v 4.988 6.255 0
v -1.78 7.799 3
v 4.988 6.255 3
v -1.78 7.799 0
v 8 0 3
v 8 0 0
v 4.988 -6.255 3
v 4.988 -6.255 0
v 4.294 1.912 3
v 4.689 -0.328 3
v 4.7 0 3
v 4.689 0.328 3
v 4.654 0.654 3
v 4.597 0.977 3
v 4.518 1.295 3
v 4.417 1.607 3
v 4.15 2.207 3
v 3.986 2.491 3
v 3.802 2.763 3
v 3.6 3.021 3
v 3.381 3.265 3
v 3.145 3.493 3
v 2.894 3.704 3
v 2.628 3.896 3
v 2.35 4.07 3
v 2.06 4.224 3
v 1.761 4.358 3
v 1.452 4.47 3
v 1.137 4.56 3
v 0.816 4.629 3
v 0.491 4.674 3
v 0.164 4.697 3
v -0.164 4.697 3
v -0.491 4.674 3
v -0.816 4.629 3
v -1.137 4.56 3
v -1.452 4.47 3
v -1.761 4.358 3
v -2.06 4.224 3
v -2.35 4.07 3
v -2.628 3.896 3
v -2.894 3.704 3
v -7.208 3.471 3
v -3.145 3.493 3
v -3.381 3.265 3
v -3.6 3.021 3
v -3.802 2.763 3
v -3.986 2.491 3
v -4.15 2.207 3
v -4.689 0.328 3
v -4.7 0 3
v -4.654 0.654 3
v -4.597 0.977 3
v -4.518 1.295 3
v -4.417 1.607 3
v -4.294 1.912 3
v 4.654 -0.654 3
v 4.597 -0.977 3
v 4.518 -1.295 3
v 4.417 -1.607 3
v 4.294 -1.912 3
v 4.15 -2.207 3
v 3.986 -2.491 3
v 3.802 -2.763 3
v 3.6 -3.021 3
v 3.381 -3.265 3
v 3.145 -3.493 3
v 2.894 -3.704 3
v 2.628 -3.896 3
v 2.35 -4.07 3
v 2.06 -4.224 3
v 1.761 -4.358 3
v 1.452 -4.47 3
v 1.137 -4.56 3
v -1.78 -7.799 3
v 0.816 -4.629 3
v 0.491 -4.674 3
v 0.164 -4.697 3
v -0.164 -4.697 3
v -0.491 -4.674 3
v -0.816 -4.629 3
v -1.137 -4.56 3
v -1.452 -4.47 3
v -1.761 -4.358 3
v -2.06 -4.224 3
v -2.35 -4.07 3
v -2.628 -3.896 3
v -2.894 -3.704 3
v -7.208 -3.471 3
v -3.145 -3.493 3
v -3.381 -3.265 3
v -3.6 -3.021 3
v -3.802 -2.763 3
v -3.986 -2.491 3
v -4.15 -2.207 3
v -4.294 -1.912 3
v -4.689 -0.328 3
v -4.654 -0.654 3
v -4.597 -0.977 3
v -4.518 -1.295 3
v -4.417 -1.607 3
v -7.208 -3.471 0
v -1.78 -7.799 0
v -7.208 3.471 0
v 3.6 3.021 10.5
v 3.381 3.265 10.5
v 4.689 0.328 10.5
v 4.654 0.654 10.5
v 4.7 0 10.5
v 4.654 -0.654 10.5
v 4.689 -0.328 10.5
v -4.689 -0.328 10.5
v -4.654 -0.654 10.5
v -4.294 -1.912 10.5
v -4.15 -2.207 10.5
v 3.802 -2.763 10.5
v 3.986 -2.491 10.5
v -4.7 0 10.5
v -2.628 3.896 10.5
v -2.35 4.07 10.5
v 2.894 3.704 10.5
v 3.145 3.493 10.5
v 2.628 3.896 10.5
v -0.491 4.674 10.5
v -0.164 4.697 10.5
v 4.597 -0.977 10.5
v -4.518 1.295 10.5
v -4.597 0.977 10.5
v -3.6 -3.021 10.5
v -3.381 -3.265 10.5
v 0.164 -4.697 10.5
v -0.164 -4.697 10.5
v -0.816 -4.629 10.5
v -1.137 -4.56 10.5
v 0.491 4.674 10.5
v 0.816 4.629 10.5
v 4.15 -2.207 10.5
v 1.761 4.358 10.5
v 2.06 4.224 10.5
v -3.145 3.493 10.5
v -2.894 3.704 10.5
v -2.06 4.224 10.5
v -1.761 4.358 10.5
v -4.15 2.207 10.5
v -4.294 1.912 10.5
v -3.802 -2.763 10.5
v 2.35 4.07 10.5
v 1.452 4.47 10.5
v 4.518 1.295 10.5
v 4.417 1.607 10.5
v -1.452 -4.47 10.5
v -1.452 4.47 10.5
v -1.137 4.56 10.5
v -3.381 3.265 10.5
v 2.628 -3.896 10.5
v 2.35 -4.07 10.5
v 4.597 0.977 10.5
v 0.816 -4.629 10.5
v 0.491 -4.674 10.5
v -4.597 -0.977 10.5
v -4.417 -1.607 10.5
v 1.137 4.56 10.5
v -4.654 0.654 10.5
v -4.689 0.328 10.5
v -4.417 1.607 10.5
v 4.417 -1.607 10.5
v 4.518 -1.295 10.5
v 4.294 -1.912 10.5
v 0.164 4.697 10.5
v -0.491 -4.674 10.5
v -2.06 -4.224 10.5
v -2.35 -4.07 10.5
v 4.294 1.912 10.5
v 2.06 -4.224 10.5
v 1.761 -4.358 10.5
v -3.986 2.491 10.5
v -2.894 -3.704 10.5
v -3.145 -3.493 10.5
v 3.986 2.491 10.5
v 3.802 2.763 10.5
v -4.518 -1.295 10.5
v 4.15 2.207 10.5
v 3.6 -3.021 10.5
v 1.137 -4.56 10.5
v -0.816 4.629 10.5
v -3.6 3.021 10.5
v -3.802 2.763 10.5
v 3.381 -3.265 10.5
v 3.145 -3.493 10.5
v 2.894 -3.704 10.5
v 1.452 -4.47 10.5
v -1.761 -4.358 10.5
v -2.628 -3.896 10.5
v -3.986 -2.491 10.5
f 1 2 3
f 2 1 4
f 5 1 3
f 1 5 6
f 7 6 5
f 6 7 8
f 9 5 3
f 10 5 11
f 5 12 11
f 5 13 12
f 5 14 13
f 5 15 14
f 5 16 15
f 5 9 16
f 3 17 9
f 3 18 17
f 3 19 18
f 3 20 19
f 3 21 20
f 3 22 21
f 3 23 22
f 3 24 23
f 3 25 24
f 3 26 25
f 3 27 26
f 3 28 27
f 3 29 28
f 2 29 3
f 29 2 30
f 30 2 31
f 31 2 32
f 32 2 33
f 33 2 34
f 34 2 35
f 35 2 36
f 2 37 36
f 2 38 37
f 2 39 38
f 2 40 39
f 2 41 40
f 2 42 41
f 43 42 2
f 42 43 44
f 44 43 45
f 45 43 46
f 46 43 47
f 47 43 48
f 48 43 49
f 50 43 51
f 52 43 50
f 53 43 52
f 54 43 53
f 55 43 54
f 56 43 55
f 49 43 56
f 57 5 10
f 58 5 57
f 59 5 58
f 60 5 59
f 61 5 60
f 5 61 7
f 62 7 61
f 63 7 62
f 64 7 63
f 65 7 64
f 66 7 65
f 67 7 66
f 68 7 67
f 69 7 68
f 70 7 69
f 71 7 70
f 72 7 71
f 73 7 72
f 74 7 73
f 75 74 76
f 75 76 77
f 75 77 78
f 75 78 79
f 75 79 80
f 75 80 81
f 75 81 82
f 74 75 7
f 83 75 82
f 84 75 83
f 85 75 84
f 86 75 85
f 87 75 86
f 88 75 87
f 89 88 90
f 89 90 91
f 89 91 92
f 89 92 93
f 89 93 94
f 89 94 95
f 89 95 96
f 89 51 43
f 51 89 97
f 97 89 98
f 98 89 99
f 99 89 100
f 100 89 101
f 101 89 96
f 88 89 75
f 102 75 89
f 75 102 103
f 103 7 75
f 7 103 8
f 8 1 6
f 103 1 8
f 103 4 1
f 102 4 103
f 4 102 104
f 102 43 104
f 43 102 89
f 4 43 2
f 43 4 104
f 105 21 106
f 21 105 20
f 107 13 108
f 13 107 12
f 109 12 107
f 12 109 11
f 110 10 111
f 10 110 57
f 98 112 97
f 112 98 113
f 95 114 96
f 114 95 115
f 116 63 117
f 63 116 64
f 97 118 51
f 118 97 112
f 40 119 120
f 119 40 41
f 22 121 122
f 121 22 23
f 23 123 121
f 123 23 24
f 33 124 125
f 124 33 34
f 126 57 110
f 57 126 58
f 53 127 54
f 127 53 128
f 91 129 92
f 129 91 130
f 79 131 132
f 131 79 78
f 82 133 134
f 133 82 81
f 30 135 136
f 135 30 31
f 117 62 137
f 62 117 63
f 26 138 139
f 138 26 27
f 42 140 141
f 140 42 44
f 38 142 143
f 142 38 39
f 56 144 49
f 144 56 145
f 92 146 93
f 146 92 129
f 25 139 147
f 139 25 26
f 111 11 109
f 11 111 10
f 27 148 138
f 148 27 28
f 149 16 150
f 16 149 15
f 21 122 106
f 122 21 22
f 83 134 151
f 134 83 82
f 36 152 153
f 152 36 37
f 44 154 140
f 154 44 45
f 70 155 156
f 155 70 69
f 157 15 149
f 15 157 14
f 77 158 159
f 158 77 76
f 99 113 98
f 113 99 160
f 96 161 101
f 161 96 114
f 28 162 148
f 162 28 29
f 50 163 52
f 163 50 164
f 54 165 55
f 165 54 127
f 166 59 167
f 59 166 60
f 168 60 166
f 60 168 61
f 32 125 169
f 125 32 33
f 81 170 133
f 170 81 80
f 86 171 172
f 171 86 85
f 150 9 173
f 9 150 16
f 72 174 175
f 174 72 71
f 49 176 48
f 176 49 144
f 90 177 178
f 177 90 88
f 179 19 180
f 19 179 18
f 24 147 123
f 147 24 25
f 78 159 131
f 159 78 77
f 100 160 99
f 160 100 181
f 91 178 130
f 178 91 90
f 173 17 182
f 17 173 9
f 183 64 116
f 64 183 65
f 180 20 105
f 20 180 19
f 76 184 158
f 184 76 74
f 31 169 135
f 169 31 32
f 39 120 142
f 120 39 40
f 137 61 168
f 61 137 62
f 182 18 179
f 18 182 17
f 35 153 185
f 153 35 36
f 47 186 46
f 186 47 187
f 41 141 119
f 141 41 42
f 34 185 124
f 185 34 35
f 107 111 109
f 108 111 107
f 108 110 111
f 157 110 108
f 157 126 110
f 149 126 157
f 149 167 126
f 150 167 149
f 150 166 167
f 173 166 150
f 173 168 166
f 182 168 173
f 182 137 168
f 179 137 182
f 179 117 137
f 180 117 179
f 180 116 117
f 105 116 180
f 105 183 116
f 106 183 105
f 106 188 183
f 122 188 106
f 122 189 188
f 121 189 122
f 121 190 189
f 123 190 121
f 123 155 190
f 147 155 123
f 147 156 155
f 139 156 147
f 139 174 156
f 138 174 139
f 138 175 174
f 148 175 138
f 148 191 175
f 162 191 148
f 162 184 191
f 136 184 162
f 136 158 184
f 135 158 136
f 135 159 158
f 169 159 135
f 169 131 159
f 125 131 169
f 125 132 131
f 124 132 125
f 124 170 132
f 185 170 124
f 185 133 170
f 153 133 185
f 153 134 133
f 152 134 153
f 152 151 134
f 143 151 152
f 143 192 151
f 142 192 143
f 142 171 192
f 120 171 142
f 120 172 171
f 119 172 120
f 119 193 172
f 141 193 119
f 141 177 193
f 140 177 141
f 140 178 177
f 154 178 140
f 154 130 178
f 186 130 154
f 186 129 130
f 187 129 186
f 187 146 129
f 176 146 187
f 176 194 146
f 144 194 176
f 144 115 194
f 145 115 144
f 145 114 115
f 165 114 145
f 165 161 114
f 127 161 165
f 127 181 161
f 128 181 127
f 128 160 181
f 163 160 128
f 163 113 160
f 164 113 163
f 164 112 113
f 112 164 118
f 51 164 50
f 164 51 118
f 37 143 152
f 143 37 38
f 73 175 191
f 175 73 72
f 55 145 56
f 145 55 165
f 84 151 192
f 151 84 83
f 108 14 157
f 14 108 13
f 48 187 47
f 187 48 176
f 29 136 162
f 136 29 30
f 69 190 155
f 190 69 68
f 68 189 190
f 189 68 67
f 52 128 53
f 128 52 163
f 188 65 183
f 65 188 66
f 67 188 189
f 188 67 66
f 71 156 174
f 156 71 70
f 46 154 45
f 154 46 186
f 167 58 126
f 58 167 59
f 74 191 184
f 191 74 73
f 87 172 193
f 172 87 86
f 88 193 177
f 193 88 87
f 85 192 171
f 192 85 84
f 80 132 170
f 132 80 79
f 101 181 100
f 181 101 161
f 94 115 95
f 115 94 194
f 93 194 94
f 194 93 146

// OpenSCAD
// -*- mode: SCAD ; c-file-style: "ellemtel" ; coding: utf-8 -*-
//
// Testkoerper fuer Drehkalenderzapfen
//
// (c) 2017 Roland Sieker <ospalh@gmail.com>
// Licence: CC-0 4.0

ri = 4.7;
ro = 8;
h = 7.5;
hb = 3;

echo(ri*10-40);
cylinder(r=ro, h=hb, $fn=ri*10-40);
cylinder(r=ri, h=hb+h, $fn=90);
